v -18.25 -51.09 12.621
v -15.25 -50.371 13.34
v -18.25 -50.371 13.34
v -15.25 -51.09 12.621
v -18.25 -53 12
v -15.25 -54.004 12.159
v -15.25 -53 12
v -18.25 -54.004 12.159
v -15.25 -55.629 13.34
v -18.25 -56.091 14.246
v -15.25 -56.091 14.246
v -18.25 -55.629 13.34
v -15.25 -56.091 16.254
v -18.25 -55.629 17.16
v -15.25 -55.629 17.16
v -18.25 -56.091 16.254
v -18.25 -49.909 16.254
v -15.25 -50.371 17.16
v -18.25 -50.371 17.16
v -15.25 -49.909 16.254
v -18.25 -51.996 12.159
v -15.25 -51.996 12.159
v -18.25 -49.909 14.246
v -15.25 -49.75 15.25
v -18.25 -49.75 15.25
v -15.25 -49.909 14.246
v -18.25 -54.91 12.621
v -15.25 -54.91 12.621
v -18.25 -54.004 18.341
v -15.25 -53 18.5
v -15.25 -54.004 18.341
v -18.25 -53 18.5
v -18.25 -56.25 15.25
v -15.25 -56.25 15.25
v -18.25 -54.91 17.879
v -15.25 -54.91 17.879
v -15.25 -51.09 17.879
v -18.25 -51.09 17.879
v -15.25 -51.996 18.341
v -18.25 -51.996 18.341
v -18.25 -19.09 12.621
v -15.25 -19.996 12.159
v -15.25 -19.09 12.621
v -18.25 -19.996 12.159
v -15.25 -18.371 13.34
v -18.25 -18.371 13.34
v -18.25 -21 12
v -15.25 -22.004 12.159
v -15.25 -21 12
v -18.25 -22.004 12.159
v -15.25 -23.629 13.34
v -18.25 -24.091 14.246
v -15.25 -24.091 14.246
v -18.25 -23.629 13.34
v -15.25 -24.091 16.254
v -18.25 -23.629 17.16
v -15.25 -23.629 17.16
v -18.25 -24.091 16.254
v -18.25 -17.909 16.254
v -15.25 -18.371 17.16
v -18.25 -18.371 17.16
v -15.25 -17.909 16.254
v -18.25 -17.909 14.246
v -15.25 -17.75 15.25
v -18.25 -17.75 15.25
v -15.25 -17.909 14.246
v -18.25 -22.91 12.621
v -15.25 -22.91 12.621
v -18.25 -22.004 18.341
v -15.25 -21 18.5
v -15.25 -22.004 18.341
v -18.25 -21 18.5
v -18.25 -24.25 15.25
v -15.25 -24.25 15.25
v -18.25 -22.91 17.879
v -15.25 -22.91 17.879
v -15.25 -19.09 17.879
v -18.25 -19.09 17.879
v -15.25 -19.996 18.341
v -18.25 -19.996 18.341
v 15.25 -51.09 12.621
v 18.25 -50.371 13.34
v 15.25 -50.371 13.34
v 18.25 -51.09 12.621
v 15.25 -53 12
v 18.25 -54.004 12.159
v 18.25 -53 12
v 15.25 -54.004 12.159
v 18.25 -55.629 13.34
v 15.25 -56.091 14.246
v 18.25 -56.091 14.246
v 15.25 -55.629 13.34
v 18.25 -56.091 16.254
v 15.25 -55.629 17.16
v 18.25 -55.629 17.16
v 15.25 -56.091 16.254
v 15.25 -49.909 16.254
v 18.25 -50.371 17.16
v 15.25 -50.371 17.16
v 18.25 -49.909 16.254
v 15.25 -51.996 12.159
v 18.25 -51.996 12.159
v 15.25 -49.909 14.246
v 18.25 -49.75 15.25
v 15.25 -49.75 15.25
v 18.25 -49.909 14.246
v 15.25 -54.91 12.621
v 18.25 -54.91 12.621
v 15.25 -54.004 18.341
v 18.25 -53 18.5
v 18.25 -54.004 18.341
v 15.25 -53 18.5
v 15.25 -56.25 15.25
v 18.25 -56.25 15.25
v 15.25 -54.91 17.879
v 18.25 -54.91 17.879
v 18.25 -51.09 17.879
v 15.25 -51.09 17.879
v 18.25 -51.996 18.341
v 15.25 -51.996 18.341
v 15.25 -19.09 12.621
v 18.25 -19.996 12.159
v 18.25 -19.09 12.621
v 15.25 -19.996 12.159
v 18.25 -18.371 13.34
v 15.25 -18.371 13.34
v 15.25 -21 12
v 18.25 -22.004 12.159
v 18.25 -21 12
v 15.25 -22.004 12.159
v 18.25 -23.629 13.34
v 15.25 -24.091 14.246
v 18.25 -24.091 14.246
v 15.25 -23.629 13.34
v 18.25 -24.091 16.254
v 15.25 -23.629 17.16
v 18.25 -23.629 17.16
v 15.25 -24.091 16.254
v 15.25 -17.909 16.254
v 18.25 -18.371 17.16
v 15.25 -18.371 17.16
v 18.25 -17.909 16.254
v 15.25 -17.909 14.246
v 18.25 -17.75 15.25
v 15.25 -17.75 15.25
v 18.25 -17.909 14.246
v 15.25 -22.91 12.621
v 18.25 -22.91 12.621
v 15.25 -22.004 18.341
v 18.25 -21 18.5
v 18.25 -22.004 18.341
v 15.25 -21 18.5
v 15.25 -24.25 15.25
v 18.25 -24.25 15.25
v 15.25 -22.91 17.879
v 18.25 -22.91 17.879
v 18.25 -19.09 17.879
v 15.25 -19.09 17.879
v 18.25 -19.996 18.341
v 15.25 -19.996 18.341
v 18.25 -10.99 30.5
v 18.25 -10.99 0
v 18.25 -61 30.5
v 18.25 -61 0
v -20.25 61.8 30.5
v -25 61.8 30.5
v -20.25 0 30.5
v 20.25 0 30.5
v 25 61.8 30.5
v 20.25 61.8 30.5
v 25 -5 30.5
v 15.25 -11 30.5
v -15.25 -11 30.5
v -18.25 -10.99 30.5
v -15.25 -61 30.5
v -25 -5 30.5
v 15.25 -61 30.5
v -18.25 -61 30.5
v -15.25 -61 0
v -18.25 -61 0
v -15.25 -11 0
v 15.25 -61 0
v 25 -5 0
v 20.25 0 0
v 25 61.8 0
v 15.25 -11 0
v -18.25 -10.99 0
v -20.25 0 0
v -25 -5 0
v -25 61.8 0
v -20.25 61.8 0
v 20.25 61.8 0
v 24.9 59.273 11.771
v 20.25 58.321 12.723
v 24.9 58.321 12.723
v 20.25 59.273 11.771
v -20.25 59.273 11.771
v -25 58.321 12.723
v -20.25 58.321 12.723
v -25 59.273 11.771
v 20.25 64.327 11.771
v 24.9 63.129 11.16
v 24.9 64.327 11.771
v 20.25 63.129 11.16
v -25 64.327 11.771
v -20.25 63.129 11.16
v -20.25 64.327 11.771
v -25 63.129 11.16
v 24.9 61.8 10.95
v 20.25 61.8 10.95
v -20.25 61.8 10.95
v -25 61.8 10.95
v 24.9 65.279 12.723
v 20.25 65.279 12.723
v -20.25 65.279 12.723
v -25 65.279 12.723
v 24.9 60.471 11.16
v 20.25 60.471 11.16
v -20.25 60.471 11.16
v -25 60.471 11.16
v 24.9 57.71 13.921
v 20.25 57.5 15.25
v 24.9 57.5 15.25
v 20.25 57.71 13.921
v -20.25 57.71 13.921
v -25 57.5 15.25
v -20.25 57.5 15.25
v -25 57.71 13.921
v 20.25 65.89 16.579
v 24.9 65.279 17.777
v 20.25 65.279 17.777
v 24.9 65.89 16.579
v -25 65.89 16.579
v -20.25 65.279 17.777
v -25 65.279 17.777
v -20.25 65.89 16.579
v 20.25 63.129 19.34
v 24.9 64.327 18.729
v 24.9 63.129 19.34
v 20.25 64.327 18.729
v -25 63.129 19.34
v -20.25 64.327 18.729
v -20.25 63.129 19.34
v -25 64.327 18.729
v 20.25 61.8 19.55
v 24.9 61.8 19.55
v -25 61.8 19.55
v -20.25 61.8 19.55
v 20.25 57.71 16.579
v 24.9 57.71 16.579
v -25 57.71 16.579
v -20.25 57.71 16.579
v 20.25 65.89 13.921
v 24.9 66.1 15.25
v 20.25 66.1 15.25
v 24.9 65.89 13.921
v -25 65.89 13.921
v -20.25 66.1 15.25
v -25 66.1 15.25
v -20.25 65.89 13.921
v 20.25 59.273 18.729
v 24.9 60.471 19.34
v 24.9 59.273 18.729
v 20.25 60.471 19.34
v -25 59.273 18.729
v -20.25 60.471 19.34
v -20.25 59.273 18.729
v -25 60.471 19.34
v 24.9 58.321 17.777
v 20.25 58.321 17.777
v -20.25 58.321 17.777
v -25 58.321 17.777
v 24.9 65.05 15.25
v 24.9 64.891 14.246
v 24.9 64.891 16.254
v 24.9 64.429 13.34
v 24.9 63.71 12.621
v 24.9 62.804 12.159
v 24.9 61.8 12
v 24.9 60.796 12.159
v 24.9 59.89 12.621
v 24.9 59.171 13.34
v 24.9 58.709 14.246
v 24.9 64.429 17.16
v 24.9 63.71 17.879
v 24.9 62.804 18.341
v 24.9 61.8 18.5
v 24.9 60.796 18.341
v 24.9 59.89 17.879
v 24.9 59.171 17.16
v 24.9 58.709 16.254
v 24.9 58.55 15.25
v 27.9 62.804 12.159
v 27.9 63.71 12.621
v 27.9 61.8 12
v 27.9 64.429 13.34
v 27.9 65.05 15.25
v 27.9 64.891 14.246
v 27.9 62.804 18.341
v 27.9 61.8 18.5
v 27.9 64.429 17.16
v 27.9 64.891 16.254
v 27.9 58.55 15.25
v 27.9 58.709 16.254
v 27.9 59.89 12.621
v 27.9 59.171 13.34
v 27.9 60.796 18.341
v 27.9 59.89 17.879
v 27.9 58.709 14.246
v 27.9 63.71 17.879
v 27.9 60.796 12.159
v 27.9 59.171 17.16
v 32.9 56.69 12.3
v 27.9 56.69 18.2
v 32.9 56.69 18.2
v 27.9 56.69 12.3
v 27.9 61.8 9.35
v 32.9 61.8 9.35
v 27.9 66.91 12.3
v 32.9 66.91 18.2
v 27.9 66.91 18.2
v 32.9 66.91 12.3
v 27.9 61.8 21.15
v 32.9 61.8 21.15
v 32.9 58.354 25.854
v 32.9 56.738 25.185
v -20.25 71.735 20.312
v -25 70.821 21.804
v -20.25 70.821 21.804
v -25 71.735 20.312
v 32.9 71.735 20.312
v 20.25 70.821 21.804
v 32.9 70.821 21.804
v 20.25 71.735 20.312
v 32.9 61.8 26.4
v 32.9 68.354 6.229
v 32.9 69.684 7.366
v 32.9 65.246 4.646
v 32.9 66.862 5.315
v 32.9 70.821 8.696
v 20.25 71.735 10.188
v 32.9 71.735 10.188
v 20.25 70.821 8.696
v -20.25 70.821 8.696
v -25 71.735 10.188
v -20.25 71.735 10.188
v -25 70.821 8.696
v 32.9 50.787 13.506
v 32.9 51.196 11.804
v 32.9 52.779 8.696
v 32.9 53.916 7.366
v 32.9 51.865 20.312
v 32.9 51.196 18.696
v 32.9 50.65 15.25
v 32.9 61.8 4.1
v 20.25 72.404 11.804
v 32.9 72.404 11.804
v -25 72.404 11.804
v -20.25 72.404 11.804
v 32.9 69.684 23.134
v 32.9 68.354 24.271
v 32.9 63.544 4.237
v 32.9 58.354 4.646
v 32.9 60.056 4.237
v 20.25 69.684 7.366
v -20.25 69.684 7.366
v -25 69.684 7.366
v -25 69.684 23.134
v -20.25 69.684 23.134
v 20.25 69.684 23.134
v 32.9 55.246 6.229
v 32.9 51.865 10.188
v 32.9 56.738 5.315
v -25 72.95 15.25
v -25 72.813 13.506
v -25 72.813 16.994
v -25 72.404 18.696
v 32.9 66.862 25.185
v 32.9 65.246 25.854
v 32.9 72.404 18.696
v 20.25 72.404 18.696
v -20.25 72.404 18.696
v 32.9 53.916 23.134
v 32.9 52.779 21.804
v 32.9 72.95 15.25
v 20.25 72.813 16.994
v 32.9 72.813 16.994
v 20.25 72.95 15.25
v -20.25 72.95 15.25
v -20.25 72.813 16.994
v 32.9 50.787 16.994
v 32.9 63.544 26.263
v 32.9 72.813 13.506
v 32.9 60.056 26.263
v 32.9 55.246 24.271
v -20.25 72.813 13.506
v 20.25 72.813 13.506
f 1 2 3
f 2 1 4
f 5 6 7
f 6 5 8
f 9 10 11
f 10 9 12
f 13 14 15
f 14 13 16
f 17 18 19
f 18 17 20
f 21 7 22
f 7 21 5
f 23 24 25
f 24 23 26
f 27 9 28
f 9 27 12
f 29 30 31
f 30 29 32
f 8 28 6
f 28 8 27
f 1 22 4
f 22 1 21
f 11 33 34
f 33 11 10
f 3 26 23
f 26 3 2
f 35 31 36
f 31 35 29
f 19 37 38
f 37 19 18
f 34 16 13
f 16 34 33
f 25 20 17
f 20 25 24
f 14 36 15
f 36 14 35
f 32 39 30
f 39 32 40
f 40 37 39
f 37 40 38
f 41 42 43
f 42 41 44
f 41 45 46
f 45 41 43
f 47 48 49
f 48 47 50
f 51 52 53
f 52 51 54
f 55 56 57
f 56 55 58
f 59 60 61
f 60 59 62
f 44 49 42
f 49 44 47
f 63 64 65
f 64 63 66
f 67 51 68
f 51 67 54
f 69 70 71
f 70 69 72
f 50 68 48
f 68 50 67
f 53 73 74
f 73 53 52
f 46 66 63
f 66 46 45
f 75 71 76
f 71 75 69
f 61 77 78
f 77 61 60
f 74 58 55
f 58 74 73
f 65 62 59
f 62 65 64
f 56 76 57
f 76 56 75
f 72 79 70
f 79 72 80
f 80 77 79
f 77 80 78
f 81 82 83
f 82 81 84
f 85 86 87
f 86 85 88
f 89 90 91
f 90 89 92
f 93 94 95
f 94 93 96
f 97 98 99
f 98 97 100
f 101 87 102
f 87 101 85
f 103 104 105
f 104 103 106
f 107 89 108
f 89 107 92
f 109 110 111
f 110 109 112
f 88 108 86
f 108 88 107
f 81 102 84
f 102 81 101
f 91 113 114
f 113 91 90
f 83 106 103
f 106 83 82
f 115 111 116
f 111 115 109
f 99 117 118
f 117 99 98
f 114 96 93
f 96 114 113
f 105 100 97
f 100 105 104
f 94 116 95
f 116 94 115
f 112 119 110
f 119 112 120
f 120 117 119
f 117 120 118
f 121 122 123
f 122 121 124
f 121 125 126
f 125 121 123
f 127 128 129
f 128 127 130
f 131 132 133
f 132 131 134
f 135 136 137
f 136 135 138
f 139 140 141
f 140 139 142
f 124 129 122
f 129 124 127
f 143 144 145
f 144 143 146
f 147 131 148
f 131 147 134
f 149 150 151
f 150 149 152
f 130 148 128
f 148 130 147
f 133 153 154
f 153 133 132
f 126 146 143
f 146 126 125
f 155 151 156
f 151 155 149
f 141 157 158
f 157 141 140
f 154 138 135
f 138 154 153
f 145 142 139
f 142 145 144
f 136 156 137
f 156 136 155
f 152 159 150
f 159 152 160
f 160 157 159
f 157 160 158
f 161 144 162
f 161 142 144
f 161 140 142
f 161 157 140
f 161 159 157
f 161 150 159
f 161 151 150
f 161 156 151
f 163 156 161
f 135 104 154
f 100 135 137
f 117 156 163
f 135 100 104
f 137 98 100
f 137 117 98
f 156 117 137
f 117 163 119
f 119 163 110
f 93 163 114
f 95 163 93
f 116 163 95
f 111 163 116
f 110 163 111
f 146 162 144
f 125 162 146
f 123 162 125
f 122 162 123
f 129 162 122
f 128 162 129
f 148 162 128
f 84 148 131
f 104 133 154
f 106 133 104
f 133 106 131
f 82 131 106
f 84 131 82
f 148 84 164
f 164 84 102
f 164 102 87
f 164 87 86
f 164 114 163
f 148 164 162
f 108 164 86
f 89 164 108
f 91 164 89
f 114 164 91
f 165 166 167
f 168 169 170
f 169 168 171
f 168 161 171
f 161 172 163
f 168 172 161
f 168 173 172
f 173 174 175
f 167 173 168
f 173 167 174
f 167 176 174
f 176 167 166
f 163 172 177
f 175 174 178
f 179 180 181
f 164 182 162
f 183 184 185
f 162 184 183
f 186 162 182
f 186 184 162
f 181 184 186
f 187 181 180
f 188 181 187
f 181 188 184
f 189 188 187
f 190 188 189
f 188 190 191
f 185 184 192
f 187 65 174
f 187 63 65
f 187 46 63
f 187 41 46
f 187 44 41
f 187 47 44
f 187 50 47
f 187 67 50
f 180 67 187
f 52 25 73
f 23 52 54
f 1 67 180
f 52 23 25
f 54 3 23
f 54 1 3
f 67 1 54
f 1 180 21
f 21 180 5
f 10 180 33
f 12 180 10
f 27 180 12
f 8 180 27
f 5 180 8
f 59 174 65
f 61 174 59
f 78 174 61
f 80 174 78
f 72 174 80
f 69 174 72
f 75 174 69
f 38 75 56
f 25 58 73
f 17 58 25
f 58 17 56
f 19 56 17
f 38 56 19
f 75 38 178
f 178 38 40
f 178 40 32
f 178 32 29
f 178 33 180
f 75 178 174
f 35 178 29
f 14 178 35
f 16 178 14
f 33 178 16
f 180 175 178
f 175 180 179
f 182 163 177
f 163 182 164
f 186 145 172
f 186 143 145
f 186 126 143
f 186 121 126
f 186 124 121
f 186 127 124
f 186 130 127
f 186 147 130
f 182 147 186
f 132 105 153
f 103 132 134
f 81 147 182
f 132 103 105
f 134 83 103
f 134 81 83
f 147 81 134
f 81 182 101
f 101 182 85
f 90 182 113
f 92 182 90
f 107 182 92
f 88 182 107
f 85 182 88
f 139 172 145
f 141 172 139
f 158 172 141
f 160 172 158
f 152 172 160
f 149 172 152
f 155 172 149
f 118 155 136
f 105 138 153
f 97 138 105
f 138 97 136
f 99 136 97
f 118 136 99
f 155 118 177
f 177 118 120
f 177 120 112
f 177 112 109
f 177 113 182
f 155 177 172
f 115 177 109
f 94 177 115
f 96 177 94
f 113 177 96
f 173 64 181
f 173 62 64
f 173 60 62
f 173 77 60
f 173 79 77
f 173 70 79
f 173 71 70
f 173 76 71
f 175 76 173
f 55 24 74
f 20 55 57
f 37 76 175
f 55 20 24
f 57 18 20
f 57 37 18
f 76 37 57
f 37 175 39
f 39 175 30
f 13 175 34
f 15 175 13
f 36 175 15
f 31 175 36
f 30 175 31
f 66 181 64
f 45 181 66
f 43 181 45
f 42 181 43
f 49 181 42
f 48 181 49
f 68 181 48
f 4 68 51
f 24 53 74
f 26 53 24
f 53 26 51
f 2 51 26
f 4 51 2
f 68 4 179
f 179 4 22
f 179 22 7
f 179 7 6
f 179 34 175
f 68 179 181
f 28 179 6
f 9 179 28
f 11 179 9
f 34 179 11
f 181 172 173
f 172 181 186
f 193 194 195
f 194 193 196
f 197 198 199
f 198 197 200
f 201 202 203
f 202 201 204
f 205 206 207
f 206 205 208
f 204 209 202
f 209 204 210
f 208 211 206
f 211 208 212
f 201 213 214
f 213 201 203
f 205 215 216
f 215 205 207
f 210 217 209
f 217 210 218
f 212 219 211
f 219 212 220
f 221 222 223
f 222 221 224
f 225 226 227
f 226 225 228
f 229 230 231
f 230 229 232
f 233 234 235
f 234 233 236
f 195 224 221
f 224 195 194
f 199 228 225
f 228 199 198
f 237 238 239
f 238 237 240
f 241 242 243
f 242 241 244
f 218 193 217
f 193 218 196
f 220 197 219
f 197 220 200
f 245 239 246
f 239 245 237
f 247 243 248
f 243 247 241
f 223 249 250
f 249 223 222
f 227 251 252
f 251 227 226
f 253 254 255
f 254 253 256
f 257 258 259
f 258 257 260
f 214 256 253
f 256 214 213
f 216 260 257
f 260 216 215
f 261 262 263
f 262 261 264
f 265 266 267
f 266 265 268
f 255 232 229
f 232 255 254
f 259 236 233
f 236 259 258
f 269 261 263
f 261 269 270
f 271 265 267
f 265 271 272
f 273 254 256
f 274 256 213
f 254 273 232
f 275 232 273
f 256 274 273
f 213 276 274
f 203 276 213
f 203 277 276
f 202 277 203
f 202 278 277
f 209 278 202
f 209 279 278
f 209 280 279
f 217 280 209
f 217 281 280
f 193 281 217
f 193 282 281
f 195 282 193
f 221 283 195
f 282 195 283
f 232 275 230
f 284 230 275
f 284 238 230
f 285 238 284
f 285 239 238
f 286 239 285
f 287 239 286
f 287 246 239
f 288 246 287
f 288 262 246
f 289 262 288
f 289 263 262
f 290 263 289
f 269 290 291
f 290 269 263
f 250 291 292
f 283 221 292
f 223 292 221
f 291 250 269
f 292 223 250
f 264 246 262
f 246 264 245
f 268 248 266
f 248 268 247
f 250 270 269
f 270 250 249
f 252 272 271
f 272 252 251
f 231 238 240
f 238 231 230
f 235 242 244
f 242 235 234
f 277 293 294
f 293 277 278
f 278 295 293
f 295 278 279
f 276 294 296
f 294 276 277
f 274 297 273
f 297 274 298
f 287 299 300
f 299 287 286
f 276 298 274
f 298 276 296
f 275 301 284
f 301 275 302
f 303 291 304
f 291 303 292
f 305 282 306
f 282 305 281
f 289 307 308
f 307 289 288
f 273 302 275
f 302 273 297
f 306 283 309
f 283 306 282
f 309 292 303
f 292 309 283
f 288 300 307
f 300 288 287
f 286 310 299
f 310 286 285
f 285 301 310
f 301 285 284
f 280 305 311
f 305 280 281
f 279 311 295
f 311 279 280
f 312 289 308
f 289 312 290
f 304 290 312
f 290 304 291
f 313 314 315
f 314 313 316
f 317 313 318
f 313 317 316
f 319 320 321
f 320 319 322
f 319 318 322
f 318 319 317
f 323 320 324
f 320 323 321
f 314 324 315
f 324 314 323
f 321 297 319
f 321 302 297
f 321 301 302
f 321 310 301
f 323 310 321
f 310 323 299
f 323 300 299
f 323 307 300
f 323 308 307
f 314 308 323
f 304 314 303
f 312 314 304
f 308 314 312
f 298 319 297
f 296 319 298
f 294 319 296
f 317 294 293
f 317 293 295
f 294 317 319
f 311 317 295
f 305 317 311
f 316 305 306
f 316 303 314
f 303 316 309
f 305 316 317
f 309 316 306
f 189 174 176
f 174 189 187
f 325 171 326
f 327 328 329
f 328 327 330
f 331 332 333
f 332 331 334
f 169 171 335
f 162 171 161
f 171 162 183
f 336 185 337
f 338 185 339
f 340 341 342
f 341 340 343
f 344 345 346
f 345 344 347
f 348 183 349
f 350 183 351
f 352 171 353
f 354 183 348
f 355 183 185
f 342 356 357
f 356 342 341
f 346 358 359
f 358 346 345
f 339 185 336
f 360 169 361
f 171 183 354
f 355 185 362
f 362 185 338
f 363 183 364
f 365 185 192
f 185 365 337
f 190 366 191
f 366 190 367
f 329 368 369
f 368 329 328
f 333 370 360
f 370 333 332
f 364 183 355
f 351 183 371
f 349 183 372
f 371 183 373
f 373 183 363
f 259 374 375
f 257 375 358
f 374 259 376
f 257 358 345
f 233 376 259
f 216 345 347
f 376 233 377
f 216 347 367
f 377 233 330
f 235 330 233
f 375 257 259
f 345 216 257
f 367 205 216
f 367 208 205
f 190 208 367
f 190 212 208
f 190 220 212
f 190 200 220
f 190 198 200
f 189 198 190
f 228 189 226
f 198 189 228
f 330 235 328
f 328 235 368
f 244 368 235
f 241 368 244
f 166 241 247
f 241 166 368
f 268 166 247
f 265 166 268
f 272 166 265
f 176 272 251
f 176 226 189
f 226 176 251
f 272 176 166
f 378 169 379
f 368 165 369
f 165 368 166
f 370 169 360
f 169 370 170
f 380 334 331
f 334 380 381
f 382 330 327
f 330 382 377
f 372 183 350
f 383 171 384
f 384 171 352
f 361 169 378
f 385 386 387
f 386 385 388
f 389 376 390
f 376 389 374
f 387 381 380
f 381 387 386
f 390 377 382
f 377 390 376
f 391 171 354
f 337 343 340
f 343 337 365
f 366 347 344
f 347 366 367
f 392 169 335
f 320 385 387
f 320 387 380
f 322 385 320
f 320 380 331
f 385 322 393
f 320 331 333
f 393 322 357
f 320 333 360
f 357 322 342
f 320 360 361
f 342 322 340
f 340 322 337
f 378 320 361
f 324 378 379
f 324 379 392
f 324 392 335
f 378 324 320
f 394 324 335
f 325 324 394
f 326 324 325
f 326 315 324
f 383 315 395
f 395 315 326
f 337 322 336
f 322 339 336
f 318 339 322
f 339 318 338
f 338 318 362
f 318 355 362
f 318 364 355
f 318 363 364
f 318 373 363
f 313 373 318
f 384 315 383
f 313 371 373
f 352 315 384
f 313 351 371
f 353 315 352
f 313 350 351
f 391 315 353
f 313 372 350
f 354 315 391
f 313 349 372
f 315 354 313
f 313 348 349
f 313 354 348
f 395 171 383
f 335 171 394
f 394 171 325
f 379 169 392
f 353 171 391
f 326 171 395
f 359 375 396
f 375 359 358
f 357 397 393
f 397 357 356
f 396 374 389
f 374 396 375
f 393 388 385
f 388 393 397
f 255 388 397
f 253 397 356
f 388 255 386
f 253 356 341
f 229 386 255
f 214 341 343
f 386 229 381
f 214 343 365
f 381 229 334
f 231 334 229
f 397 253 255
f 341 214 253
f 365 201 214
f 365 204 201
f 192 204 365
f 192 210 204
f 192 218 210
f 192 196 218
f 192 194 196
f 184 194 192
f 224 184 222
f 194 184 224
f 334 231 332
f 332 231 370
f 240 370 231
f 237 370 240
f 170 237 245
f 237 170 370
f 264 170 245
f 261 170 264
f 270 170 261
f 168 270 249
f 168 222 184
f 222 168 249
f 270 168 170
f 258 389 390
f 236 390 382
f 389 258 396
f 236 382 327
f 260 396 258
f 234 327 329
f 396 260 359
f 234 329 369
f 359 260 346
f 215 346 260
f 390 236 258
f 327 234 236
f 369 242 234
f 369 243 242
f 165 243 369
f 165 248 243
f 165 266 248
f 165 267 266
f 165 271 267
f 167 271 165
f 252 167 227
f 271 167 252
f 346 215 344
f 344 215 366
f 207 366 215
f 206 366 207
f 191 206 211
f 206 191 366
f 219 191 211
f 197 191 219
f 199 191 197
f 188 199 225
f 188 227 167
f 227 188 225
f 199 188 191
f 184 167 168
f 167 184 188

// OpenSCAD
// file: ../src/lib/ALU_profile_holder_top.scad
include <../../parameters.scad>



module ALU_profile_holder_top(deep=35) {
    wall_thickness = ALU_profile_holder_wall_thickness;
    
    module screw_holes() {
        translate([wall_thickness/2, 8, ALU_profile_width/2]) {
            rotate([0, 90, 0]) 
                cylinder(d=M6_screw_diameter, h=wall_thickness*2, center=true, $fn=20);
        }
        translate([wall_thickness/2, deep-10, ALU_profile_width/2]) {
                rotate([0, 90, 0])
                cylinder(d=M6_screw_diameter, h=wall_thickness*2, center=true, $fn=20);
            
        }
    }
    
    difference() {
        cube([ALU_profile_width+wall_thickness*2, deep+wall_thickness*2, ALU_profile_width]);
        translate([wall_thickness, -0.1, -0.1])
            cube([ALU_profile_width, deep+0.1, ALU_profile_width+0.2]);
        
        screw_holes();
        translate([ALU_profile_width+wall_thickness, 0, 0])
            screw_holes();
    }
}

ALU_profile_holder_top(35);
// file: ../src/888_5004.scad
include <../parameters.scad>
use <./lib/ALU_profile_holder_top.scad>


height = ALU_profile_width+608_bearing_outer_diameter-2+ALU_profile_holder_wall_thickness*2+5;


module 888_5004_hinge_attachment() {
    translate([-(50)/2, height, ALU_profile_width/2])
    rotate([0, 90, 0])
    cylinder(h=50, d=8);
    
    
    translate([-(ALU_profile_width+ALU_profile_holder_wall_thickness*2)/2, height-10, ALU_profile_width/2-10])
    cube([ALU_profile_width+ALU_profile_holder_wall_thickness*2, 20, 20]);
}

module 888_5004() {

    translate([-ALU_profile_width/2-ALU_profile_holder_wall_thickness, -55-ALU_profile_holder_wall_thickness*2, 0])
        ALU_profile_holder_top(50);

    difference() {
        hull() {
            translate([-50/2, -5, 0])
            cube([50, height+5, ALU_profile_width]);

            translate([ALU_profile_width/-2-ALU_profile_holder_wall_thickness, -ALU_profile_holder_wall_thickness*2-5+.01, 0])
            cube([ALU_profile_width+ALU_profile_holder_wall_thickness*2, ALU_profile_holder_wall_thickness*2, ALU_profile_width]);

            translate([(3+M6_nut_height)/2, height, ALU_profile_width/2])
            rotate([0, 90, 0])
            cylinder(d=608_bearing_outer_diameter, h=50+3+M6_nut_height, center=true, $fn=40);
        }

        translate([-(ALU_profile_width+ALU_profile_holder_wall_thickness*2+4)/2, 0, -0.1])
        cube([ALU_profile_width+ALU_profile_holder_wall_thickness*2+4, height+608_bearing_outer_diameter/2, ALU_profile_width+0.2]);

        translate([-50/2-0.1, height, ALU_profile_width/2])
        rotate([0, 90, 0])
        union() {
            cylinder(d=M8_screw_diameter, h=50, $fn=20);
            cylinder(d=M6_screw_diameter, h=70, $fn=20);
            
            translate([0, 0, 50+3])
            cylinder(d=M6_nut_diameter, h=70, $fn=6);
        }
    }
}

888_5004();

#888_5004_hinge_attachment();
// file: ../parameters.scad
maximum_printable_size = 150;

layer_thickness = 0.3;
global_clearance = 0.5;


//Screw diameter and nut for M10 [mm]
M10_screw_diameter = 10.4;
M10_head_height = 10;
M10_head_diameter = 16+0.5;
M10_nut_height = 10.5;
M10_nut_diameter = 25.5;
M10_nut_pocket = 22.3;

//Screw diameter for M8 [mm]
M8_screw_diameter = 8.6;
M8_head_height = 8;
M8_head_diameter = 13.5;
M8_nut_height = 7.5;
M8_square_nut_thin_height = 4.5;
M8_nut_diameter = 14.4 + 0.5;
M8_nut_pocket = 13 + 0.5;
M8_washer_diameter = 16;
M8_washer_thickness = 1.5;


//Screw diameter and nut for M6 [mm]
M6_screw_diameter=6.5;
M6_head_diameter = 10+0.5;
M6_head_height = 6;
M6_nut_height = 4.9;
M6_nut_diameter = 11.8;
M6_nut_pocket = 10.4;
M6_square_nut_height = 3;
M6_square_nut_diameter = 10;
M6_washer_thickness = 1.6;

//Screw diameter and nut for M5 [mm]
M5_screw_diameter=5.5;
M5_head_height = 5;
M5_head_diameter = 13+0.5;
M5_nut_height = 4.5;
M5_nut_diameter = 9.4;
M5_nut_pocket = 8.4;

//Screw diameter and nut for M4 [mm]
M4_screw_diameter=4.5;
M4_screw_head_height = 4;
M4_nut_height = 3.2;
M4_nut_diameter = 8.4;
M4_nut_pocket = 7.5;

//Screw diameter and nut for M3 [mm]
M3_screw_diameter = 3.2;
M3_nut_height = 2.7;
M3_nut_diameter = 6.6;
M3_nut_pocket = 5.6;
M3_screw_head_height = 3;

//Screw diameter and nut for M2,5 [mm]
M2_5_screw_diameter = 2.7;
M2_5_nut_height = 2.3;
M2_5_nut_diameter = 6;
M2_5_nut_pocket = 5.5;

// kulove lozisko

bearing_efsm_08_h = 33+1;
bearing_efsm_08_m = 22;
bearing_efsm_08_db = 18;
bearing_efsm_08_ag = 10.5;
bearing_efsm_08_n = M4_screw_diameter;
bearing_efsm_08_a1 = 5.5;
bearing_efsm_08_d = 8.25;
bearing_efsm_08_B = 8; // ball height

bearing_efsm_10_h = 38+1;
bearing_efsm_10_m = 26;
bearing_efsm_10_db = 21.9;
bearing_efsm_10_ag = 12+0.2;
bearing_efsm_10_n = M5_screw_diameter;
bearing_efsm_10_a1 = 6.5;
bearing_efsm_10_d = 10.25;


bearing_efsm_12_width = 40+1;
bearing_efsm_12_h = bearing_efsm_12_width;
bearing_efsm_12_boltd = 28/2; // polovina vzdalenosti mezi srouby
bearing_efsm_12_m = bearing_efsm_12_boltd*2;
bearing_efsm_12_db = 25;
bearing_efsm_12_ag = 13;
bearing_efsm_12_a1 = 7;
bearing_efsm_12_n = M5_screw_diameter;
bearing_efsm_12_d = 12.15;
bearing_efsm_12_B = 10; // ball height
bearing_efsm_space = 1;

bearing_efsm_17_width = 54+1;
bearing_efsm_17_h = bearing_efsm_17_width;
bearing_efsm_17_boltd = 38/2; // polovina vzdalenosti mezi srouby
bearing_efsm_17_m = bearing_efsm_17_boltd*2;
bearing_efsm_17_db = 35;
bearing_efsm_17_ag = 18;
bearing_efsm_17_n = M6_screw_diameter;
bearing_efsm_17_a1 = 10;
bearing_efsm_17_B = 17; // ball height

//limcove lozisko
bearing_EFOM_10_L=26; //celkova sirka zakladny
bearing_EFOM_10_d1=10.3;//diametr otvoru real=10 mm
bearing_EFOM_10_dB=22;//diametr vystupku pro ulozeni lozika
bearing_EFOM_10_H=52;//celková delka zakladny
bearing_EFOM_10_J=36;// hole pitch
bearing_EFOM_10_A1=6.5;//vyska pouzdra
bearing_EFOM_10_Ag=12;//celkova vyska
bearing_EFOM_10_N1=5;//sirka otvoru pro sroub
bearing_EFOM_10_N2=8;//delka otvoru pro sroub
bearing_EFOM_10_m=36;//roztec der pro sroub
bearing_EFOM_10_h=9;//vyska lozika


608_bearing_outer_diameter = 22.3;
608_bearing_inner_diameter = 16;
608_bearing_thickness = 7.1;


// 20 KG servo parameters

servo_20kg_axis_offset = 9.375; // jak je osa mimo stredu
servo_20kg_body_x = 42;
servo_20kg_body_y = 21;
servo_20kg_body_z = 40;
servo_20kg_thread_x = 49/2;
servo_20kg_thread_y = 10/2;
servo_20kg_body_below = 10; // jak hluboko je tělo serva pod drzaky na srouby
servo_20kg_below = 25.8; // jak hluboko je páka serva pod drzaky na srouby

servo_20kg_bolt_d = 2.5+0.3;
servo_20kg_nut_d = 5+0.3;


//strain gauge
strain_gauge_width = 12.7;
strain_gauge_length = 75.1;
strain_gauge_screw_distance = 10;

//ALU profile
ALU_profile_width = 30.5;
ALU_profile_holder_wall_thickness = 3;
ALU_profile_groove_width = 8;

//pillow block bearing
//https://www.igus.eu/product/372
//Part no. KSTM-08
KSTM08_screws_distance = 33;         //m
KSTM08_screws_holes_diameter = 4.5;  //d2
KSTM08_flange_thickness = 6;         //h3
KSTM08_case_width = 9;               //C1
KSTM08_case_length = 47;             //a
KSTM08_ball_width = 12;              //B
KSTM08_ball_hole_diameter = 7.85;    //d1


//ložiska pro malý rotor
bearing_outer_diameter = 10.2;    // Rozměr B1 v nákresu s přídavkem na toleranci otvoru
bearing_thickness = 4;        // Rozměr B2 v nákresu
//bearing_shaft_length = 19.5;    // Rozměr B3 v nákresu, Originalni hodnota 19.5
bearing_shaft_length = 20;    // Rozměr B3 v nákresu


//parametry víčka s telemetrickou anténou
S01_sila_materialu=1.2;
S01_vyska_horni_zavit=10;
S01_hloubka_zavitu=4;
S01_prumer_vnitrni=50;
LO_spodni_prumer=17.2;
LO_vyska_bez_krytu=15;
S01_tolerance_zavit=1.5;
R01_vyska_prekryti_statoru=10;

g3_0_cone1 = 70;
g3_0_srcew_dist = 55;



// scale parameters
base_length = 500;
mid_base_width = 500;
mid_base_height = 200;
mid_base_length = 500;
mid_base_x_offset = 50;
base_mid_base_hinge_offset = 50;
tower_height = 185;
tower_angle = atan((mid_base_width/2-ALU_profile_width-10)/tower_height);
tower_arm_length = tower_height/cos(tower_angle);
tower_drag_z_offset = 22;
// main file
include <../parameters.scad>
use <../src/888_5004.scad>

888_5004();
